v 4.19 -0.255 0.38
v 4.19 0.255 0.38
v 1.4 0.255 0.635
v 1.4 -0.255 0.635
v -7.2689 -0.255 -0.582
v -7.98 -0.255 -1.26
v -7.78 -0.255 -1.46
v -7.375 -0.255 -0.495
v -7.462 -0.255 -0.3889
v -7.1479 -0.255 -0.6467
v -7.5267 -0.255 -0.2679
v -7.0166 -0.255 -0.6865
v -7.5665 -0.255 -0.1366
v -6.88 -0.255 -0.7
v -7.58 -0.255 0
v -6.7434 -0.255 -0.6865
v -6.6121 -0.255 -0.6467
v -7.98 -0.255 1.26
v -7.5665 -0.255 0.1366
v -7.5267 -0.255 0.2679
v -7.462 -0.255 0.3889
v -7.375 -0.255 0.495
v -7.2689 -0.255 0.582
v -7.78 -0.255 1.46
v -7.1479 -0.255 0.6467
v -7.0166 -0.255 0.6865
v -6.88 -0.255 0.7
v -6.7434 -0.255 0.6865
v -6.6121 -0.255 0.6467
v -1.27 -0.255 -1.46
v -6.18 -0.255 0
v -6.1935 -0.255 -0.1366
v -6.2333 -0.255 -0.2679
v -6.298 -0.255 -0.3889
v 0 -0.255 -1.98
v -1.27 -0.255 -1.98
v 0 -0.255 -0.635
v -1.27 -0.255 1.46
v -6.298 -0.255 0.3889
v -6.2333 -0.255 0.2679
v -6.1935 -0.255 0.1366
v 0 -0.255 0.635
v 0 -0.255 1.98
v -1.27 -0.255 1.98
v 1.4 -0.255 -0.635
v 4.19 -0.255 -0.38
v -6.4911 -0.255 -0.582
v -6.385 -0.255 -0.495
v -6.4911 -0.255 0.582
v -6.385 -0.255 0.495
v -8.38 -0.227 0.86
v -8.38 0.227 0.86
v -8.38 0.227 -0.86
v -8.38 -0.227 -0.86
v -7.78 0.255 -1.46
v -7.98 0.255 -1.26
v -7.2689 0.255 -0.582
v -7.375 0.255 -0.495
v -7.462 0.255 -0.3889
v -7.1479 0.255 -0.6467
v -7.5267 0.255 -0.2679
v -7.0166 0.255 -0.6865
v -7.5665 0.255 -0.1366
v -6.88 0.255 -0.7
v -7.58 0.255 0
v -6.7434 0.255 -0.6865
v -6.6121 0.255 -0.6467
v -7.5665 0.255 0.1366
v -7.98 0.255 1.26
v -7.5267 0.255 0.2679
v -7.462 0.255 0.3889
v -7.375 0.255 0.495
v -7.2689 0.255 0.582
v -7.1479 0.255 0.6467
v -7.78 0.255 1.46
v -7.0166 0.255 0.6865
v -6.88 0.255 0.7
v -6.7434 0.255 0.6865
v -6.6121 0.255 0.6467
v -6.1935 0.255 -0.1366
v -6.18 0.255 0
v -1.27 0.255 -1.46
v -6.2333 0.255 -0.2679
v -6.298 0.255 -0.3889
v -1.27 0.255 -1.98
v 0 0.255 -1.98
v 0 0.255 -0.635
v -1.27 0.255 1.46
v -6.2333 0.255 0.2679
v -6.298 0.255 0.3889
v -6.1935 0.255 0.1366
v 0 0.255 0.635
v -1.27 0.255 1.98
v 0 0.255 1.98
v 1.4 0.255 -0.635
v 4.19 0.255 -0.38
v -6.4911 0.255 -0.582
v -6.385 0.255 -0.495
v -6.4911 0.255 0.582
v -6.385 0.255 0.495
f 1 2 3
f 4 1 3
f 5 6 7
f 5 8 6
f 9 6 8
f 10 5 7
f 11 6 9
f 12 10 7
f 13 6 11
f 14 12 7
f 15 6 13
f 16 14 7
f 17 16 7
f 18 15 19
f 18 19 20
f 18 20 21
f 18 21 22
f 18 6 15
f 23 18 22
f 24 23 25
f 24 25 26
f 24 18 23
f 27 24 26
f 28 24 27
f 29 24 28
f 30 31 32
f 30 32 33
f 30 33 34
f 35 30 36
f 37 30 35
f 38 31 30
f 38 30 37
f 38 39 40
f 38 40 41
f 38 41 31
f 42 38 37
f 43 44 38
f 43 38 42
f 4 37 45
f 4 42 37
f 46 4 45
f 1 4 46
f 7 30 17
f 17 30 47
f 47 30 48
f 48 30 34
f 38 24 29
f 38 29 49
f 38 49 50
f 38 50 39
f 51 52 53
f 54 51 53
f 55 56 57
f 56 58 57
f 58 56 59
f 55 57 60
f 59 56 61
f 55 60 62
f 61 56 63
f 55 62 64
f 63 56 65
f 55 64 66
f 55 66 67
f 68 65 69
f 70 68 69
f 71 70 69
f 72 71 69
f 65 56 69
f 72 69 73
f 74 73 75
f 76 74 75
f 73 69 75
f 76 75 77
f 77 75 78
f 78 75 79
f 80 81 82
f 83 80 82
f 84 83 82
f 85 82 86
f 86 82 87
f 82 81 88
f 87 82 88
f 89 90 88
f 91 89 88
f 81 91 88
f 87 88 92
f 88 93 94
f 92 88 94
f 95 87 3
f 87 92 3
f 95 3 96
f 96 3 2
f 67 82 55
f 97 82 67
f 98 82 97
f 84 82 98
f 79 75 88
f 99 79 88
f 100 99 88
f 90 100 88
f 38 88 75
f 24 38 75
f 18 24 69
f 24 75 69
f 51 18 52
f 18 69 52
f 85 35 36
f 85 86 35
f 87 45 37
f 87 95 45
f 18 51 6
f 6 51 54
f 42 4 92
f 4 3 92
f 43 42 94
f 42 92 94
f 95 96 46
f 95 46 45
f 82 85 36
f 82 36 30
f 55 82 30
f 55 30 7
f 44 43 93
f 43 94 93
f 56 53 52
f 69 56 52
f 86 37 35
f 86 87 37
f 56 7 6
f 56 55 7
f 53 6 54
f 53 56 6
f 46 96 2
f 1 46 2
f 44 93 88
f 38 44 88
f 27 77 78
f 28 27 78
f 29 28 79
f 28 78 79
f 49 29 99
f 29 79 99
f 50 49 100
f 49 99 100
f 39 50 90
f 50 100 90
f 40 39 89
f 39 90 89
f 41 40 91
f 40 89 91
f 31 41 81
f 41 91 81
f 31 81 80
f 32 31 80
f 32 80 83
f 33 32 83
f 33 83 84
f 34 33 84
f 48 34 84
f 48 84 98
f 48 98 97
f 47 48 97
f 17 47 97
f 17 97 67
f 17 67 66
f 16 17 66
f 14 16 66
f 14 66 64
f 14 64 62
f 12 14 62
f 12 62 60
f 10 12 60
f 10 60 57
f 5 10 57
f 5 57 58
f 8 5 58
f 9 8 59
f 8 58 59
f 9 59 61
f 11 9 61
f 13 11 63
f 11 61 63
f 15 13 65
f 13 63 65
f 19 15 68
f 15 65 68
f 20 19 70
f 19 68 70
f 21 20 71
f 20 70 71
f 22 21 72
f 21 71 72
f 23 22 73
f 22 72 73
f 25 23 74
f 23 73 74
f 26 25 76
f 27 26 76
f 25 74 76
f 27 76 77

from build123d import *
from OCP.BRepFilletAPI import BRepFilletAPI_MakeChamfer

# Parameters (mm, degrees)
BOSS_EXTRUDE1_DEPTH = 0.255
SKETCH2_R           = 0.7
CUT_EXTRUDE1_DEPTH  = 9.625827497
CHAMFER1_SIZE       = 0.4
CHAMFER1_SIZE2      = 0.027970725


with BuildPart() as part:
    # Sketch1 → Boss-Extrude1 (new, symmetric)
    with BuildSketch(Plane(origin=(0, 0, 0), x_dir=(1, 0, 0), z_dir=(0, 1, 0))):
        Polygon((0, 1.98), (-1.27, 1.98), (-1.27, 1.46), (-7.78, 1.46), (-8.38, 0.86), (-8.38, 0), (4.19, 0), (4.19, 0.38), (1.4, 0.635), (0, 0.635), align=None)
    boss_extrude1 = extrude(amount=BOSS_EXTRUDE1_DEPTH, both=True)

    # Mirror1: Boss-Extrude1 across plane
    add(boss_extrude1.mirror(Plane(origin=(-8.38, 0.255, 0), x_dir=(1, 0, 0), z_dir=(0, 0, -1))))

    # Sketch2 → Cut-Extrude1 (cut, through all)
    with BuildSketch(Plane(origin=(0, 0.255, 0), x_dir=(1, 0, 0), z_dir=(0, 1, 0))):
        with Locations((-6.88, 0)):
            Circle(SKETCH2_R)
    extrude(amount=-CUT_EXTRUDE1_DEPTH, mode=Mode.SUBTRACT)

    # Chamfer1: one chamfer whose edges measure the first distance from different faces: ONE call of the kernel's chamfer builder (chamfer() names one face for all edges)
    chamfer1_edges_1 = [part.edges().sort_by_distance(p)[0] for p in [
        (-8.38, -0.255, 0),
    ]]
    chamfer1_side_1 = [part.faces().sort_by_distance(p)[0] for p in [
        (-2.842081645, -0.255, 0),
    ]]
    chamfer1_edges_2 = [part.edges().sort_by_distance(p)[0] for p in [
        (-8.38, 0.255, 0),
    ]]
    chamfer1_side_2 = [part.faces().sort_by_distance(p)[0] for p in [
        (-2.842081645, 0.255, 0),
    ]]
    chamfer1 = BRepFilletAPI_MakeChamfer(part.part.solid().wrapped)
    for e in chamfer1_edges_1:
        chamfer1.Add(CHAMFER1_SIZE, CHAMFER1_SIZE2, e.wrapped, chamfer1_side_1[0].wrapped)  # the first distance lies on this face
    for e in chamfer1_edges_2:
        chamfer1.Add(CHAMFER1_SIZE, CHAMFER1_SIZE2, e.wrapped, chamfer1_side_2[0].wrapped)  # the first distance lies on this face
    add(Compound.cast(chamfer1.Shape()), mode=Mode.REPLACE)


solid = part.part
